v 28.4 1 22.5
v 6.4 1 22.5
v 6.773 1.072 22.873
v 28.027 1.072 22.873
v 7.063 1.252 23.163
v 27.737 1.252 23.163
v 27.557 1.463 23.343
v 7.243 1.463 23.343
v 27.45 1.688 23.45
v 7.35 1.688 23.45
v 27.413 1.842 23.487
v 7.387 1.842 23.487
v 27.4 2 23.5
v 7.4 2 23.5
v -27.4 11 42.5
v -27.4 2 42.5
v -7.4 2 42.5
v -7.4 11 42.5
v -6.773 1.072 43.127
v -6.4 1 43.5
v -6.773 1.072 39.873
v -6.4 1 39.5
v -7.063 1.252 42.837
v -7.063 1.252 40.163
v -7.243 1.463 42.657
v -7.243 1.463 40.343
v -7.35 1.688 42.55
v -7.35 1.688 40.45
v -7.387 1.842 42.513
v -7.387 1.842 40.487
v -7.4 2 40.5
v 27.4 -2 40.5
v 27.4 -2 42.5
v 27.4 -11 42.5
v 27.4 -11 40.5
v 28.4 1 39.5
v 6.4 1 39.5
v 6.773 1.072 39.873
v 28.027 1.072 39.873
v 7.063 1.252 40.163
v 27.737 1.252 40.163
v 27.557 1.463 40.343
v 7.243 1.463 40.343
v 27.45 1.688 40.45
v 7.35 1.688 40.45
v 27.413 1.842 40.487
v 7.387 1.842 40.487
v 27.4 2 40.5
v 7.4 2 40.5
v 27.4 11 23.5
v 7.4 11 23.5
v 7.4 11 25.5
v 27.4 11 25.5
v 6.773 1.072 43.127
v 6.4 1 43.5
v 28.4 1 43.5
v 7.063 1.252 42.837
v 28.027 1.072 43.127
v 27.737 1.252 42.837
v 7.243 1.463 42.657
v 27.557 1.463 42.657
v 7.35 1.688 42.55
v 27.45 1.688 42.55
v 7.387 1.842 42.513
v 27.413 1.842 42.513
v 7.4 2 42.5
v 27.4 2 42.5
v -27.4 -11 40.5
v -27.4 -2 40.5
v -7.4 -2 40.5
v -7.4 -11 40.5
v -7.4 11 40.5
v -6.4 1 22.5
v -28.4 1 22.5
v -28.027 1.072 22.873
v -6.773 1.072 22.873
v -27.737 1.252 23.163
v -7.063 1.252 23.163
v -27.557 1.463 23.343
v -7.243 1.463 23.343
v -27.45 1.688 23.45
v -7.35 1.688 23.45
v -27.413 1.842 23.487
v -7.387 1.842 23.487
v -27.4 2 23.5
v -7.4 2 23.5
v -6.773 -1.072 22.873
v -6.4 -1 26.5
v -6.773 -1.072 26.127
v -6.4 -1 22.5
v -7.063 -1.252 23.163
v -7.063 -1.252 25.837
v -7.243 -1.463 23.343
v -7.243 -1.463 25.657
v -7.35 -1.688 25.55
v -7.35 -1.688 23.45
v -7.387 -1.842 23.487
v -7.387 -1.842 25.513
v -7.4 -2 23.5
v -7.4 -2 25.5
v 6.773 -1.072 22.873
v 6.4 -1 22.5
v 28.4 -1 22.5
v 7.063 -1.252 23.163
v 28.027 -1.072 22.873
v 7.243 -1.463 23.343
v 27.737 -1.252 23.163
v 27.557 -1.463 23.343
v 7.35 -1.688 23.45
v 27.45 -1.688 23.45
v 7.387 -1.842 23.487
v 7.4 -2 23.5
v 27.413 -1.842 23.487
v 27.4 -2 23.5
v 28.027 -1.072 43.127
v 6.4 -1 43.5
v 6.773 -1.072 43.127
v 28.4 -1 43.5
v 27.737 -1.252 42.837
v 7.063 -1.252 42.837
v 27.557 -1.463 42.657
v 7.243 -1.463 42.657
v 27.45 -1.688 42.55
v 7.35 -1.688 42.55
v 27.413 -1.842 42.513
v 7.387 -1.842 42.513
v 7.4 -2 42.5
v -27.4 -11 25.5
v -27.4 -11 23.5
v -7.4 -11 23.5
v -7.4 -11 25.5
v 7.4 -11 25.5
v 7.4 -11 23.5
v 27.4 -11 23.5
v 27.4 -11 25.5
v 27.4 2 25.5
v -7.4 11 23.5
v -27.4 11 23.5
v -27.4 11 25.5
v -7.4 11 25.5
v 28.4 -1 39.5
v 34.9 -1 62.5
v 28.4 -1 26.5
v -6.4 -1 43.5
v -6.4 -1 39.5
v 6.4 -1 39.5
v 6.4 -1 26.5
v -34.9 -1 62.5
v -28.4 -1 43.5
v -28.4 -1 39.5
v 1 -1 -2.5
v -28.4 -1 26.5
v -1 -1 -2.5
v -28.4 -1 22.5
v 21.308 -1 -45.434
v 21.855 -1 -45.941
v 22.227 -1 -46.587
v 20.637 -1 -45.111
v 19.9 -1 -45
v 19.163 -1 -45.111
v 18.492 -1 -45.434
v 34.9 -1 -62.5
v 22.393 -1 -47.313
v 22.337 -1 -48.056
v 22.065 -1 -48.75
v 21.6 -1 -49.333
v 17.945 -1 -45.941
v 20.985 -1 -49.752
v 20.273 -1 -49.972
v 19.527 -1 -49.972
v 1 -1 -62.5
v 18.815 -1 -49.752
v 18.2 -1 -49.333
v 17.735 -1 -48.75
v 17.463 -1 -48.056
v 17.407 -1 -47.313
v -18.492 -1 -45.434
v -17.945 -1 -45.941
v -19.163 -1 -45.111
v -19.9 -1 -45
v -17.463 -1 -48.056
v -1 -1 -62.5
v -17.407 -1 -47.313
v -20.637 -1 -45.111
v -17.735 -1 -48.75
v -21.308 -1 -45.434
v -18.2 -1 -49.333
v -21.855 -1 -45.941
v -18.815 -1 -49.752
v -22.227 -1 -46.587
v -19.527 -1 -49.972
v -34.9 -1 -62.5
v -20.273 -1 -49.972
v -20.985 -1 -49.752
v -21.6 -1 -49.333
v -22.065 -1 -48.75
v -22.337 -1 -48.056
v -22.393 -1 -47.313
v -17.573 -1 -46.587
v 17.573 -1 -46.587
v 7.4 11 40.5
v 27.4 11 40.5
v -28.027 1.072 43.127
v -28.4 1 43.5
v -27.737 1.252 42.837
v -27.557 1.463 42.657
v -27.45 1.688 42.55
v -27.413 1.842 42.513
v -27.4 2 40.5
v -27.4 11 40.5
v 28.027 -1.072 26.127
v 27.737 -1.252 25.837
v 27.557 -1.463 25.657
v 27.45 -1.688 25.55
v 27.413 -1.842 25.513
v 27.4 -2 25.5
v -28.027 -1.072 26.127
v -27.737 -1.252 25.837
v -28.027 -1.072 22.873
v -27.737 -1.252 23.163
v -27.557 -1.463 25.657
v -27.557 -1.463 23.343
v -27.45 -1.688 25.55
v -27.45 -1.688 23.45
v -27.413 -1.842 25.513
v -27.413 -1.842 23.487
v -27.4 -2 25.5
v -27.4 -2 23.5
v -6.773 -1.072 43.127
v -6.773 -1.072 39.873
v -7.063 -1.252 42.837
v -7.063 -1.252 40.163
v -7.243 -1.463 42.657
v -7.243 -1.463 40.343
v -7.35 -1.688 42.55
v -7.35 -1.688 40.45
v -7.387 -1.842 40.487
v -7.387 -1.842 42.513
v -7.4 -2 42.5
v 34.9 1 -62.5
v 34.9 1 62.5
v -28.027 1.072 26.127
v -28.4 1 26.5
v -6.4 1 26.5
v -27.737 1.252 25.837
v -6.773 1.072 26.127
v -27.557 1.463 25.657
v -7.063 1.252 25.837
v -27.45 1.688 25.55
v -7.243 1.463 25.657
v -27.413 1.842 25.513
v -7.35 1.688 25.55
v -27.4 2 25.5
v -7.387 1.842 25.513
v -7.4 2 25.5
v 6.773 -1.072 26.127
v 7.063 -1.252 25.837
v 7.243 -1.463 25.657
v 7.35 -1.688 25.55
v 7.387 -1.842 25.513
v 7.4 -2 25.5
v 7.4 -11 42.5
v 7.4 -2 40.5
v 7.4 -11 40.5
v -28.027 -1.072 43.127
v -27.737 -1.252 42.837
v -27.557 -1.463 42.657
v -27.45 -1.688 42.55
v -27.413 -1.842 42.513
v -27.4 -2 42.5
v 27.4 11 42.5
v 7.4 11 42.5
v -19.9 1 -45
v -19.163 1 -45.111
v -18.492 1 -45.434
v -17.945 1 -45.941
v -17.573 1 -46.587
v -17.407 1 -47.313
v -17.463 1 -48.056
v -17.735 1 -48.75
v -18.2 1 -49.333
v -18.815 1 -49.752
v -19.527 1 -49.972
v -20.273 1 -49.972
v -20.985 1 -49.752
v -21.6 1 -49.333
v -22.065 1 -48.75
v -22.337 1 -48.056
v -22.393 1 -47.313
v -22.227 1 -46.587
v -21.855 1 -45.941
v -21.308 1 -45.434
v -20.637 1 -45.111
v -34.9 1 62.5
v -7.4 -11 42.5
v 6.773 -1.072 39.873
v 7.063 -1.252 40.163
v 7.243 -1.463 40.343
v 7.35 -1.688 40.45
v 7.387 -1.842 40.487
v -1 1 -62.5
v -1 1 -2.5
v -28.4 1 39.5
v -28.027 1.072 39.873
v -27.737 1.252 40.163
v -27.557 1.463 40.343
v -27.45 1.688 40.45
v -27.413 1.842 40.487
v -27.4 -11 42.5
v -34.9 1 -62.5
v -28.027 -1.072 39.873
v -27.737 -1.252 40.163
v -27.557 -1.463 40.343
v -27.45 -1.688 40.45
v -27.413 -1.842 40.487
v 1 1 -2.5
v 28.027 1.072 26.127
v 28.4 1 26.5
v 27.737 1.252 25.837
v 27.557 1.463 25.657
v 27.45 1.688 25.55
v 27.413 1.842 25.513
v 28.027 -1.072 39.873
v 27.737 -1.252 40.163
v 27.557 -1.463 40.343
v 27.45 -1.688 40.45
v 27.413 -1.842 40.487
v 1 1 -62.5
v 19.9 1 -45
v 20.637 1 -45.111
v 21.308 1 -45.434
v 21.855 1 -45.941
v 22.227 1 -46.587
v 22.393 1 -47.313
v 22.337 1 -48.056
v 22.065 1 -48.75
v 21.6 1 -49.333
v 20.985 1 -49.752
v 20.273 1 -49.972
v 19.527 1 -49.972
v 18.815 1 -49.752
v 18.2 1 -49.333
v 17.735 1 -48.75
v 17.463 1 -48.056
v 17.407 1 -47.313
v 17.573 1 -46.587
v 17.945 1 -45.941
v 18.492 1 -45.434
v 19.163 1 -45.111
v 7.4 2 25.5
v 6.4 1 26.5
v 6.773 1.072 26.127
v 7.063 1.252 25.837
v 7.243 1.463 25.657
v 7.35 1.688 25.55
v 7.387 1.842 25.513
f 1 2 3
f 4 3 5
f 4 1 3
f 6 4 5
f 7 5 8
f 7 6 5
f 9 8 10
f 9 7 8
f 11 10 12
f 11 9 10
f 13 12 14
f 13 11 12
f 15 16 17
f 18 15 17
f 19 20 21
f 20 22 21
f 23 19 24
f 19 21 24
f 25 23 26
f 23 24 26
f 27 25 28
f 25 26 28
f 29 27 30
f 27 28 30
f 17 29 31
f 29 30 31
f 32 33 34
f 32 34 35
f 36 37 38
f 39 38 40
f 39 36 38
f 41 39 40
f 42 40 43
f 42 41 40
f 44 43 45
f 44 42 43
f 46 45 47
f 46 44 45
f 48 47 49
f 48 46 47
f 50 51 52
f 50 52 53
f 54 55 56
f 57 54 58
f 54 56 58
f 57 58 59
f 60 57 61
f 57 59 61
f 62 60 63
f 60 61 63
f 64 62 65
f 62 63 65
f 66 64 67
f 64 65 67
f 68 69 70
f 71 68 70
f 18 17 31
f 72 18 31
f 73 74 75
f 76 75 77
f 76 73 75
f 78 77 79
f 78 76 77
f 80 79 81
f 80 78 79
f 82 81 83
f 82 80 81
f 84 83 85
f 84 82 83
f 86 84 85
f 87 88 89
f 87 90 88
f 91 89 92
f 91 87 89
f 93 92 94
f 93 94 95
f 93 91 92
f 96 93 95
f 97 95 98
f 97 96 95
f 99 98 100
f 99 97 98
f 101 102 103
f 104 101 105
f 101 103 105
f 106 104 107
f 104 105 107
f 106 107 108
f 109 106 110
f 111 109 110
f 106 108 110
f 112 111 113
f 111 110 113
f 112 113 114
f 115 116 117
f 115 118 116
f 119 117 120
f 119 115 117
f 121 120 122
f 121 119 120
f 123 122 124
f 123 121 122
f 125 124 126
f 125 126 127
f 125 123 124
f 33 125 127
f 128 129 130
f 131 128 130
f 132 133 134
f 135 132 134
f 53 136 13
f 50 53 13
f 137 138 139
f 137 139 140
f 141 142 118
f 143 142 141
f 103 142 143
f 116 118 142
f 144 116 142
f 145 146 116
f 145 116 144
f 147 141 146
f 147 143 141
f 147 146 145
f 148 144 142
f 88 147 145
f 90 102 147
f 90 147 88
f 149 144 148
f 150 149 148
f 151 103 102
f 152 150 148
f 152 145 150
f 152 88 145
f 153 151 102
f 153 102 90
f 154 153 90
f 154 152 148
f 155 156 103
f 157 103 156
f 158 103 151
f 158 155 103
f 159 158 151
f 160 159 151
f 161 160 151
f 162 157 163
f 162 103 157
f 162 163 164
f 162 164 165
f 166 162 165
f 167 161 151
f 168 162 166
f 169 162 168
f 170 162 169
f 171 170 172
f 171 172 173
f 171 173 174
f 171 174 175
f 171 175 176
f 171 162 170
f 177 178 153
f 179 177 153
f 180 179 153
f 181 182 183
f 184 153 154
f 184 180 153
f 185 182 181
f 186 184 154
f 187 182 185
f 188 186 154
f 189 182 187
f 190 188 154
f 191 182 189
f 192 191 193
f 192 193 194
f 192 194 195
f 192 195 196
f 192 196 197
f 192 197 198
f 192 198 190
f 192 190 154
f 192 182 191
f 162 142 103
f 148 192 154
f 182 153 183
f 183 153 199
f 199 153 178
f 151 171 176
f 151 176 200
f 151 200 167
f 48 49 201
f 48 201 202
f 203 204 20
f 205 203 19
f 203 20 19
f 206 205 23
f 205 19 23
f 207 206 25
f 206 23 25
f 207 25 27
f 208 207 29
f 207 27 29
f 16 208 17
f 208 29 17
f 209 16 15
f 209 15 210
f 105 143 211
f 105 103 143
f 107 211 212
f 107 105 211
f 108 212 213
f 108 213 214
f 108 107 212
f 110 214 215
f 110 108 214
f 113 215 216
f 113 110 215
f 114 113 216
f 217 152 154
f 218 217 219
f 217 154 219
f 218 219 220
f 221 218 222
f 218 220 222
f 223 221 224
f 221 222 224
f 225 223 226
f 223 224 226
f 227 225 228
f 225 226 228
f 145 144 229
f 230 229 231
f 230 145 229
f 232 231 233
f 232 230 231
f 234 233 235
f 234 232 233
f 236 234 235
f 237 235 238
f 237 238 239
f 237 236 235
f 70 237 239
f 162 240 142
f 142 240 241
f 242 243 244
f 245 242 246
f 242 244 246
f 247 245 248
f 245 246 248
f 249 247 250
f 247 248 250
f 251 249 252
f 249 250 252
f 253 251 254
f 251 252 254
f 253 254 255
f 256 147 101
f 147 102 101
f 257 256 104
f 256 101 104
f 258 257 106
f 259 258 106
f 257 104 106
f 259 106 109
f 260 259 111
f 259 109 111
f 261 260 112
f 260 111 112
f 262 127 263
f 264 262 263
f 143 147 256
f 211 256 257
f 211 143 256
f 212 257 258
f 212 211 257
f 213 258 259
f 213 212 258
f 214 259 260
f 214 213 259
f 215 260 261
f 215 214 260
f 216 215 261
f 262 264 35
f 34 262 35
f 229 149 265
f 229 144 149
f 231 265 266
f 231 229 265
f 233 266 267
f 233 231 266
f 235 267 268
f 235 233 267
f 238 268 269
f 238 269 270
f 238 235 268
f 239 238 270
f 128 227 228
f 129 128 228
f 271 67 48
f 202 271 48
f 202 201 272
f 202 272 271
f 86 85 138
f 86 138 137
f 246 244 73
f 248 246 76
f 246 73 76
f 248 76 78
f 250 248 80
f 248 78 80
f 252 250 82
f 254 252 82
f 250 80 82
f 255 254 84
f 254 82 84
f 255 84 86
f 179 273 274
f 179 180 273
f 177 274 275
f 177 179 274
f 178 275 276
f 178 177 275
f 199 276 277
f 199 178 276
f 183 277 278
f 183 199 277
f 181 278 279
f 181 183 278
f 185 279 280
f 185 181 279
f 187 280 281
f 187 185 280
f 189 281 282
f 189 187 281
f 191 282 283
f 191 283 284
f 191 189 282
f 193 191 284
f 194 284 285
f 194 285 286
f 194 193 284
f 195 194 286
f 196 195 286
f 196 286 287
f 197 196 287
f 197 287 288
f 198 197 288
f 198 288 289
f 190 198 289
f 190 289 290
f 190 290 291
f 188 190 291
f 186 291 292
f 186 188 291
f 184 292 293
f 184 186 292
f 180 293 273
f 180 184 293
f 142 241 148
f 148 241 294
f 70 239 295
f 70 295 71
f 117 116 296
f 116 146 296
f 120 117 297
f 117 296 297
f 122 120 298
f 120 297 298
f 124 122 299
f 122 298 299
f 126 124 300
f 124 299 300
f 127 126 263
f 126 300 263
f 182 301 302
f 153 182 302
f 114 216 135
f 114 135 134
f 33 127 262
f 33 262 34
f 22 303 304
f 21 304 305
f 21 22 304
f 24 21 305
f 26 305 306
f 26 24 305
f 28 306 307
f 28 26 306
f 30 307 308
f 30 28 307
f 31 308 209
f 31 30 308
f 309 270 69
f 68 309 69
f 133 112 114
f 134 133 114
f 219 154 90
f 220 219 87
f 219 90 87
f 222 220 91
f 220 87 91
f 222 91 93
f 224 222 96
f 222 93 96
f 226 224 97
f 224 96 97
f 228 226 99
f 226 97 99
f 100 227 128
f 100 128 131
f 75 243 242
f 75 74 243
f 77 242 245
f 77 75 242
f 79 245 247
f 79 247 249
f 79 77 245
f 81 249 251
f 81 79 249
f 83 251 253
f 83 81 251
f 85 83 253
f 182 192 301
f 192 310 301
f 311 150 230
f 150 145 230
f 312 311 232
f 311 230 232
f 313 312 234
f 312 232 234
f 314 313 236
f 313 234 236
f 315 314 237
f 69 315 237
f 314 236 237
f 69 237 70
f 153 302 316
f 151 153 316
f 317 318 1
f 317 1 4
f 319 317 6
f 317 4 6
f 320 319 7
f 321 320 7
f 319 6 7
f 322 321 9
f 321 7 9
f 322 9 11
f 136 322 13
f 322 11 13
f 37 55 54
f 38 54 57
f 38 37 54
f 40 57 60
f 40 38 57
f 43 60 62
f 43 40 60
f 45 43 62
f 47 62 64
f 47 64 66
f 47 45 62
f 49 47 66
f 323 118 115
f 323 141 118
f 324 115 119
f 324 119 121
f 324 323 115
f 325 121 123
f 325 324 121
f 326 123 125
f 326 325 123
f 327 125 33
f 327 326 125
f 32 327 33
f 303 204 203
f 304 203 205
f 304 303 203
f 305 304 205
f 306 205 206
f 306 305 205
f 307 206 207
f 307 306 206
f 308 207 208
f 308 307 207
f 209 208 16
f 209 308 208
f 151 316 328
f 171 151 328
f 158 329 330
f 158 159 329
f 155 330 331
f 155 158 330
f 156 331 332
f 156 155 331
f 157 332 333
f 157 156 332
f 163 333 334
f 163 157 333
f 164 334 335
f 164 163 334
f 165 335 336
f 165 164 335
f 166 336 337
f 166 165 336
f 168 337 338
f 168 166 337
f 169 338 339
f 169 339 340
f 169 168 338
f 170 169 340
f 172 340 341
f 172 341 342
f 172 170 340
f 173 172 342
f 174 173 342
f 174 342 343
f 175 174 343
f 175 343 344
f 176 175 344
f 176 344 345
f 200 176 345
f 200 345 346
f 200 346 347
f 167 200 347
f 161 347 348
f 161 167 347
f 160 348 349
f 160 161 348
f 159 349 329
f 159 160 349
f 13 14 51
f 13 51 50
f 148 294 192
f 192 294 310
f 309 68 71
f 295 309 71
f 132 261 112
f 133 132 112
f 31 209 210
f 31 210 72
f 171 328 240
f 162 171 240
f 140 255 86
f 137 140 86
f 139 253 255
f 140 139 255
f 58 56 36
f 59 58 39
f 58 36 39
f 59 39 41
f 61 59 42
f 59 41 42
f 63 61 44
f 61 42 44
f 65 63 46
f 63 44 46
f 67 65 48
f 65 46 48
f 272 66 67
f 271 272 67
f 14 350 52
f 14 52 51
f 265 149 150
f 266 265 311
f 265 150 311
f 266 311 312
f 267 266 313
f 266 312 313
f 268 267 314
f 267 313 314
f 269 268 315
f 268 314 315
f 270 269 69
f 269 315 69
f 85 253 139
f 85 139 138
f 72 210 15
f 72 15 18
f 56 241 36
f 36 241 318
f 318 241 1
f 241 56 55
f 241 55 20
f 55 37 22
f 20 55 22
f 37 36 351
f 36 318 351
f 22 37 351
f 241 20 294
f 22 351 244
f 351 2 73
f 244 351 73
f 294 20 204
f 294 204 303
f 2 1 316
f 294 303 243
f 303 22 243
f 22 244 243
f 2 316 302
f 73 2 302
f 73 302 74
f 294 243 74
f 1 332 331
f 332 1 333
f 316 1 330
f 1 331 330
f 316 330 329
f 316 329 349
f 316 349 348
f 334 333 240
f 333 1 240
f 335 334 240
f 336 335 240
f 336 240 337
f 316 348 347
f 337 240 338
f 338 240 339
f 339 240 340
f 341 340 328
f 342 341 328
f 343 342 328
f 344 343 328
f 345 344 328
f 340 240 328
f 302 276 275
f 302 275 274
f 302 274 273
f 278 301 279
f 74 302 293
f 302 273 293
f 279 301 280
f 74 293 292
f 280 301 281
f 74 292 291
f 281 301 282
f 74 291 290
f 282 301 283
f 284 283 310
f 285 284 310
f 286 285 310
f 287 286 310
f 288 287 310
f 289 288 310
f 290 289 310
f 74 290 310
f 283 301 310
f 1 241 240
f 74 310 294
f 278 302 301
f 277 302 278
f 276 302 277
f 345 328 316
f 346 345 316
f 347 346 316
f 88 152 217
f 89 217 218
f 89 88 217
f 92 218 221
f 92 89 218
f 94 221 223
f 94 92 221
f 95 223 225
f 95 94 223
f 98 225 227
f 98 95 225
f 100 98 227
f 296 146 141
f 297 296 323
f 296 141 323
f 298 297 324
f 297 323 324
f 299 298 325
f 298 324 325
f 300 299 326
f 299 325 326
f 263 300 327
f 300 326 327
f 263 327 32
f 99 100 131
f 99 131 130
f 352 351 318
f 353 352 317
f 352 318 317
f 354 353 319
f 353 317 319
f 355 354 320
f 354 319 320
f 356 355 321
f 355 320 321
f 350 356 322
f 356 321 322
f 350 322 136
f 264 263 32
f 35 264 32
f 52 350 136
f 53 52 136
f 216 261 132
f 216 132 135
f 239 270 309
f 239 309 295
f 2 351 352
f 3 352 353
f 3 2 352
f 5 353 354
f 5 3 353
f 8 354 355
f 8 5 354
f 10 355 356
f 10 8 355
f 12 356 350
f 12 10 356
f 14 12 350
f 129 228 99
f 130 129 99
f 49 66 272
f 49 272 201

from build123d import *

# Parameters (mm, degrees)
SKETCH1_R           = 2.5
BOSS_EXTRUDE1_DEPTH = 1
SKETCH2_W           = 20
SKETCH2_H           = 2
BOSS_EXTRUDE2_DEPTH = 10
FILLET2_R           = 1
FILLET3_R           = 1


with BuildPart() as part:
    # Sketch1 → Boss-Extrude1 (new, symmetric)
    with BuildSketch(Plane(origin=(0, 0, 0), x_dir=(1, 0, 0), z_dir=(0, 1, 0))):
        Polygon((1, 62.5), (34.9, 62.5), (34.9, -62.5), (-34.9, -62.5), (-34.9, 62.5), (-1, 62.5), (-1, 2.5), (1, 2.5), align=None)
        with Locations(Location((-19.9, 47.5, 0), (0, 0, 270))):
            Circle(SKETCH1_R, mode=Mode.SUBTRACT)
        with Locations(Location((19.9, 47.5, 0), (0, 0, 270))):
            Circle(SKETCH1_R, mode=Mode.SUBTRACT)
    extrude(amount=BOSS_EXTRUDE1_DEPTH, both=True)

    # Sketch2 → Boss-Extrude2 (add)
    with BuildSketch(Plane(origin=(0, 1, 0), x_dir=(1, 0, 0), z_dir=(0, 1, 0))):
        with Locations((17.4, -24.5)):
            Rectangle(SKETCH2_W, SKETCH2_H)
        with Locations((17.4, -41.5)):
            Rectangle(SKETCH2_W, SKETCH2_H)
        with Locations((-17.4, -41.5)):
            Rectangle(SKETCH2_W, SKETCH2_H)
        with Locations((-17.4, -24.5)):
            Rectangle(SKETCH2_W, SKETCH2_H)
    boss_extrude2 = extrude(amount=BOSS_EXTRUDE2_DEPTH)

    # Mirror1: Boss-Extrude2 across plane
    add(boss_extrude2.mirror(Plane.ZX))

    # Fillet2
    fillet2_edges = [part.edges().sort_by_distance(p)[0] for p in [
        (7.4, -1, 24.5),
        (17.4, -1, 25.5),
        (27.4, -1, 24.5),
        (17.4, -1, 23.5),
        (7.4, -1, 41.5),
        (17.4, -1, 42.5),
        (27.4, -1, 41.5),
        (17.4, -1, 40.5),
        (-7.4, -1, 41.5),
        (-17.4, -1, 40.5),
        (-27.4, -1, 41.5),
        (-17.4, -1, 42.5),
        (-17.4, -1, 23.5),
        (-27.4, -1, 24.5),
        (-17.4, -1, 25.5),
        (-7.4, -1, 24.5),
    ]]
    fillet(fillet2_edges, radius=FILLET2_R)

    # Fillet3
    fillet3_edges = [part.edges().sort_by_distance(p)[0] for p in [
        (7.4, 1, 24.5),
        (17.4, 1, 25.5),
        (27.4, 1, 24.5),
        (17.4, 1, 23.5),
        (7.4, 1, 41.5),
        (17.4, 1, 42.5),
        (27.4, 1, 41.5),
        (17.4, 1, 40.5),
        (-7.4, 1, 41.5),
        (-17.4, 1, 40.5),
        (-27.4, 1, 41.5),
        (-17.4, 1, 42.5),
        (-17.4, 1, 23.5),
        (-27.4, 1, 24.5),
        (-17.4, 1, 25.5),
        (-7.4, 1, 24.5),
    ]]
    fillet(fillet3_edges, radius=FILLET3_R)


solid = part.part
